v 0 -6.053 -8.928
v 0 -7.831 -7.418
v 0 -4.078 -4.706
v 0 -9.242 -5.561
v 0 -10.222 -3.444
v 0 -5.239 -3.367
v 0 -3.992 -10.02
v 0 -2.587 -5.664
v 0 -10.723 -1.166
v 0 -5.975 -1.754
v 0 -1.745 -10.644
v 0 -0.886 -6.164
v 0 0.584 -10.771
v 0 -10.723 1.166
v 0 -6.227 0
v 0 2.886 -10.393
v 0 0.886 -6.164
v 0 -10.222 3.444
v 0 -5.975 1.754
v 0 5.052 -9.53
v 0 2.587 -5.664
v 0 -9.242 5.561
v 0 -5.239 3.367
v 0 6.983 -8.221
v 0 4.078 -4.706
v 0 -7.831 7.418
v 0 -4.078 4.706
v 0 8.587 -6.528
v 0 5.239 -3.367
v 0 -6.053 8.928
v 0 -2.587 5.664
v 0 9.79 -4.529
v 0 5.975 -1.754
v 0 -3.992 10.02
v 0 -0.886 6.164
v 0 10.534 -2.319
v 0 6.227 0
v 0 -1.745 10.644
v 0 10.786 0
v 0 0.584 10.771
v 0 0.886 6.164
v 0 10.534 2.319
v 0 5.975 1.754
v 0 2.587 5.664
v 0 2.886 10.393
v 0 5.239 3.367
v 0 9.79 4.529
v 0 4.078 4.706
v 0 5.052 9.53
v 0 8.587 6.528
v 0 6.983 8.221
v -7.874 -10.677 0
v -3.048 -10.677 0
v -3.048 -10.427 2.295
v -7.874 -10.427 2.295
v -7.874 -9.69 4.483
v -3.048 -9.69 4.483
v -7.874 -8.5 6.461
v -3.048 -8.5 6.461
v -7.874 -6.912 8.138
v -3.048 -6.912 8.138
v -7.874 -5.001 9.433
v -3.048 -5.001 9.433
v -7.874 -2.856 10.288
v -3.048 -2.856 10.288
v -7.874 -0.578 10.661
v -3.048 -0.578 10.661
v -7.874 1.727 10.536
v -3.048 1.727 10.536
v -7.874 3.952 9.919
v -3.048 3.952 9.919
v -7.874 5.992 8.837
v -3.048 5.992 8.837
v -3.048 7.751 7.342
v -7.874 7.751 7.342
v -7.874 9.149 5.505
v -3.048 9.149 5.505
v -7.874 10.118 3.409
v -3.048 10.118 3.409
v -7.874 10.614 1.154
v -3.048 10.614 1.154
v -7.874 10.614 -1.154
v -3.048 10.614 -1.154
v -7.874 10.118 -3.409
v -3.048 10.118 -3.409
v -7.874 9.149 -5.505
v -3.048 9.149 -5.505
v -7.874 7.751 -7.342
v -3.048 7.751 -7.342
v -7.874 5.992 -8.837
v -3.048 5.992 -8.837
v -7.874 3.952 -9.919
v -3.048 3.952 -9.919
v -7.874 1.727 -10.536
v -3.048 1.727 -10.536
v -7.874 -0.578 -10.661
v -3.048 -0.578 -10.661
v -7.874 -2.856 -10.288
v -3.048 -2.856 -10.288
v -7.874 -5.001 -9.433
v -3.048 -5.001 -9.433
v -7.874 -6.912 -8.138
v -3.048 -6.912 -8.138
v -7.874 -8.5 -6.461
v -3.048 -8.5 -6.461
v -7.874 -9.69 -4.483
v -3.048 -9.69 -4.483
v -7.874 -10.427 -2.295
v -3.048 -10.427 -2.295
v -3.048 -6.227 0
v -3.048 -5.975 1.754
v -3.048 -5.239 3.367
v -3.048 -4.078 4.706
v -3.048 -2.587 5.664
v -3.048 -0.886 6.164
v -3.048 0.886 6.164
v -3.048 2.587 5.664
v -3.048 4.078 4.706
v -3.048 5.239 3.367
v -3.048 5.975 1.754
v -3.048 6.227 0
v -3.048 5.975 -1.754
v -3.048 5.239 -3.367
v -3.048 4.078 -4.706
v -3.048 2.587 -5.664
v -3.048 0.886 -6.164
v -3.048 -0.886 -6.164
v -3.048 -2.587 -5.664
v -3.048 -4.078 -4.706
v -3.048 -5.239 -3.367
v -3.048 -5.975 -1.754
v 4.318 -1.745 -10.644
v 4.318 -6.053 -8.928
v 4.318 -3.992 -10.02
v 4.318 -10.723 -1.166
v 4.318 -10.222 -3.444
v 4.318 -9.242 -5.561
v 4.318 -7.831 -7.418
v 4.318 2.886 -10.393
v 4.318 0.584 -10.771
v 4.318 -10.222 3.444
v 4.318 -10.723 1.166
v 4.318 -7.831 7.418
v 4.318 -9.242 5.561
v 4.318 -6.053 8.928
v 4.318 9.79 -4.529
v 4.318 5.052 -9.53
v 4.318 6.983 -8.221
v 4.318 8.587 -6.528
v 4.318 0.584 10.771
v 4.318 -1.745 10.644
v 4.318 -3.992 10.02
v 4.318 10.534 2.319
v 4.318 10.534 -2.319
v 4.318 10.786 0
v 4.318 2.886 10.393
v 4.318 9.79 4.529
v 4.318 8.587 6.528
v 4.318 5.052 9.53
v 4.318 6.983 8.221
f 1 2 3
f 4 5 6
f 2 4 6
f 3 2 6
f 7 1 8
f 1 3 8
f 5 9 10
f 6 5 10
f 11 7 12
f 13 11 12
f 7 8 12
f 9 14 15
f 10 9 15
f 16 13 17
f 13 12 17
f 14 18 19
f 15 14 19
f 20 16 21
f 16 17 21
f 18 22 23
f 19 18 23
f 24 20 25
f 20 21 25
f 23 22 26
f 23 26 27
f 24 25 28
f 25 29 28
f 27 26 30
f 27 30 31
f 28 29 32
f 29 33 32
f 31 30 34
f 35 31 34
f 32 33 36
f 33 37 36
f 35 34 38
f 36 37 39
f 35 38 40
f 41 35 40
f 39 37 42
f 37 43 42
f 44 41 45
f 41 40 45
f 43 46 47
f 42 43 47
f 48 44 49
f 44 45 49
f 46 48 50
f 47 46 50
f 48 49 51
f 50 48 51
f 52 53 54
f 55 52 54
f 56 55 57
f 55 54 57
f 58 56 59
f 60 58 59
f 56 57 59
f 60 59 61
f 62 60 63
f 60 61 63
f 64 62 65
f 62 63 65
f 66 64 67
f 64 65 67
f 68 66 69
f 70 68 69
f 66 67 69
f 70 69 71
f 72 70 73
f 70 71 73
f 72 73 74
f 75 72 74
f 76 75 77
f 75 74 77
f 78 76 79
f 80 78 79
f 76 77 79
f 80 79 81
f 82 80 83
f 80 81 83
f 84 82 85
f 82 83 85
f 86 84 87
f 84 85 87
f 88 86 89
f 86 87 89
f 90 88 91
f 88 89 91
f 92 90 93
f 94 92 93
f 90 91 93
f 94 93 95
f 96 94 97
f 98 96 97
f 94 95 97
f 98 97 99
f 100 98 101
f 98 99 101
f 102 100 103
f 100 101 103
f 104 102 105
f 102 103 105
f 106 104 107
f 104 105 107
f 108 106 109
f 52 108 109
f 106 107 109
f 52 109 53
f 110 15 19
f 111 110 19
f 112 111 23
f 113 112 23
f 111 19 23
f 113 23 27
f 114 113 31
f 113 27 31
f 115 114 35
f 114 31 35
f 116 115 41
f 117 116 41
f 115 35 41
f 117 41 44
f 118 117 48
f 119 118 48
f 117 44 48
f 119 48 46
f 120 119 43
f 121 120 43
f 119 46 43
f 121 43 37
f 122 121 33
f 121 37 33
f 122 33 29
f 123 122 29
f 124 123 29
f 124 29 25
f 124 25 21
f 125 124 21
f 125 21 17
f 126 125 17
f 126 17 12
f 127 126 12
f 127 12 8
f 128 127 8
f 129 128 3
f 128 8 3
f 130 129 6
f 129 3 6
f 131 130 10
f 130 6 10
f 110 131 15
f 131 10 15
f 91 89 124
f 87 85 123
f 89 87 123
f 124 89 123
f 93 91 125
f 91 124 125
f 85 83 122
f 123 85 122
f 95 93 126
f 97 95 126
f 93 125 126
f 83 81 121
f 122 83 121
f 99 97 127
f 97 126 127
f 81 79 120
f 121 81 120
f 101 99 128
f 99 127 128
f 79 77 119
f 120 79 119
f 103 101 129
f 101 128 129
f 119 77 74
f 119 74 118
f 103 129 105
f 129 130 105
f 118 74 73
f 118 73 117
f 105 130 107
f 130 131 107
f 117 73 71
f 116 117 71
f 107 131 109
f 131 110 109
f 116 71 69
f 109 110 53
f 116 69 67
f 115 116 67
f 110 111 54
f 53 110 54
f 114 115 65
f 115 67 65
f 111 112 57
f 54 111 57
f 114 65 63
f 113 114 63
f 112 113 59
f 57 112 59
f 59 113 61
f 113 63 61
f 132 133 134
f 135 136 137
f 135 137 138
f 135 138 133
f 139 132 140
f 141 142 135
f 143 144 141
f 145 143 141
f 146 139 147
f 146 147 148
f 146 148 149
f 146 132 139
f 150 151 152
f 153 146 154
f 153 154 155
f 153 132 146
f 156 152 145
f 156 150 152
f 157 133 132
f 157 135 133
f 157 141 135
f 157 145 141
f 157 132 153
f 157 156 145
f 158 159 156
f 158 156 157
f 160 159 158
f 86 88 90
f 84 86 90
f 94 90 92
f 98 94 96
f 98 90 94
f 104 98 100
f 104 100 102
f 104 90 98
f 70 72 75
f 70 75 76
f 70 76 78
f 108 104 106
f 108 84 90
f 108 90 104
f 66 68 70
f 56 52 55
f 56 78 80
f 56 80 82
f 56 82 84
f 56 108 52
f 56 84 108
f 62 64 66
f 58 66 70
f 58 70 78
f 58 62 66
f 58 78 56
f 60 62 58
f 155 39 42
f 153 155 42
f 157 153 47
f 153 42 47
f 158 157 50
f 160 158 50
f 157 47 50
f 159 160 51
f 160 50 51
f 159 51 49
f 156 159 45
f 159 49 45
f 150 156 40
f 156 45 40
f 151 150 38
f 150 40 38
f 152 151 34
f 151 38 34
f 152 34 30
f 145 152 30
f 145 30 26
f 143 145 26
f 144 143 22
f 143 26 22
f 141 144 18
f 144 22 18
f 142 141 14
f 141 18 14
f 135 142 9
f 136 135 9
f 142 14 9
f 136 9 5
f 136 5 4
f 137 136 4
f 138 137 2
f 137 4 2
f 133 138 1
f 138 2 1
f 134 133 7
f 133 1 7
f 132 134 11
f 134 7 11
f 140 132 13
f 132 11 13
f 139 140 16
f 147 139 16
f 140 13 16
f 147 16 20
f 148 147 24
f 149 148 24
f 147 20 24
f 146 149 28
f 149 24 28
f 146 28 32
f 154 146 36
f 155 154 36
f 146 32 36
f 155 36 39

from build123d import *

# Parameters (mm, degrees)
F0_R     = 10.7864986288
F1_DEPTH = 4.318
F2_R     = 6.2270192231
F3_DEPTH = 3.048
F4_R     = 10.6768853932
F4_R_2   = 6.2270192231
F5_DEPTH = 4.826


with BuildPart() as f1:
    # F0 (on Right) → F1 (new body)
    with BuildSketch(Plane.YZ):
        Circle(F0_R)
    extrude(amount=F1_DEPTH)

    # F2 (on face) → F3 (join)
    with BuildSketch(Plane(origin=(0, 0, 0), x_dir=(0, -1, 0), z_dir=(-1, 0, 0))):
        Circle(F2_R)
    extrude(amount=F3_DEPTH)

    # F4 (on face) → F5 (join)
    with BuildSketch(Plane(origin=(-3.048, 0, 0), x_dir=(0, -1, 0), z_dir=(-1, 0, 0))):
        Circle(F4_R)
        Circle(F4_R_2, mode=Mode.SUBTRACT)
        Circle(F4_R_2)
    extrude(amount=F5_DEPTH)


solid = f1.part
